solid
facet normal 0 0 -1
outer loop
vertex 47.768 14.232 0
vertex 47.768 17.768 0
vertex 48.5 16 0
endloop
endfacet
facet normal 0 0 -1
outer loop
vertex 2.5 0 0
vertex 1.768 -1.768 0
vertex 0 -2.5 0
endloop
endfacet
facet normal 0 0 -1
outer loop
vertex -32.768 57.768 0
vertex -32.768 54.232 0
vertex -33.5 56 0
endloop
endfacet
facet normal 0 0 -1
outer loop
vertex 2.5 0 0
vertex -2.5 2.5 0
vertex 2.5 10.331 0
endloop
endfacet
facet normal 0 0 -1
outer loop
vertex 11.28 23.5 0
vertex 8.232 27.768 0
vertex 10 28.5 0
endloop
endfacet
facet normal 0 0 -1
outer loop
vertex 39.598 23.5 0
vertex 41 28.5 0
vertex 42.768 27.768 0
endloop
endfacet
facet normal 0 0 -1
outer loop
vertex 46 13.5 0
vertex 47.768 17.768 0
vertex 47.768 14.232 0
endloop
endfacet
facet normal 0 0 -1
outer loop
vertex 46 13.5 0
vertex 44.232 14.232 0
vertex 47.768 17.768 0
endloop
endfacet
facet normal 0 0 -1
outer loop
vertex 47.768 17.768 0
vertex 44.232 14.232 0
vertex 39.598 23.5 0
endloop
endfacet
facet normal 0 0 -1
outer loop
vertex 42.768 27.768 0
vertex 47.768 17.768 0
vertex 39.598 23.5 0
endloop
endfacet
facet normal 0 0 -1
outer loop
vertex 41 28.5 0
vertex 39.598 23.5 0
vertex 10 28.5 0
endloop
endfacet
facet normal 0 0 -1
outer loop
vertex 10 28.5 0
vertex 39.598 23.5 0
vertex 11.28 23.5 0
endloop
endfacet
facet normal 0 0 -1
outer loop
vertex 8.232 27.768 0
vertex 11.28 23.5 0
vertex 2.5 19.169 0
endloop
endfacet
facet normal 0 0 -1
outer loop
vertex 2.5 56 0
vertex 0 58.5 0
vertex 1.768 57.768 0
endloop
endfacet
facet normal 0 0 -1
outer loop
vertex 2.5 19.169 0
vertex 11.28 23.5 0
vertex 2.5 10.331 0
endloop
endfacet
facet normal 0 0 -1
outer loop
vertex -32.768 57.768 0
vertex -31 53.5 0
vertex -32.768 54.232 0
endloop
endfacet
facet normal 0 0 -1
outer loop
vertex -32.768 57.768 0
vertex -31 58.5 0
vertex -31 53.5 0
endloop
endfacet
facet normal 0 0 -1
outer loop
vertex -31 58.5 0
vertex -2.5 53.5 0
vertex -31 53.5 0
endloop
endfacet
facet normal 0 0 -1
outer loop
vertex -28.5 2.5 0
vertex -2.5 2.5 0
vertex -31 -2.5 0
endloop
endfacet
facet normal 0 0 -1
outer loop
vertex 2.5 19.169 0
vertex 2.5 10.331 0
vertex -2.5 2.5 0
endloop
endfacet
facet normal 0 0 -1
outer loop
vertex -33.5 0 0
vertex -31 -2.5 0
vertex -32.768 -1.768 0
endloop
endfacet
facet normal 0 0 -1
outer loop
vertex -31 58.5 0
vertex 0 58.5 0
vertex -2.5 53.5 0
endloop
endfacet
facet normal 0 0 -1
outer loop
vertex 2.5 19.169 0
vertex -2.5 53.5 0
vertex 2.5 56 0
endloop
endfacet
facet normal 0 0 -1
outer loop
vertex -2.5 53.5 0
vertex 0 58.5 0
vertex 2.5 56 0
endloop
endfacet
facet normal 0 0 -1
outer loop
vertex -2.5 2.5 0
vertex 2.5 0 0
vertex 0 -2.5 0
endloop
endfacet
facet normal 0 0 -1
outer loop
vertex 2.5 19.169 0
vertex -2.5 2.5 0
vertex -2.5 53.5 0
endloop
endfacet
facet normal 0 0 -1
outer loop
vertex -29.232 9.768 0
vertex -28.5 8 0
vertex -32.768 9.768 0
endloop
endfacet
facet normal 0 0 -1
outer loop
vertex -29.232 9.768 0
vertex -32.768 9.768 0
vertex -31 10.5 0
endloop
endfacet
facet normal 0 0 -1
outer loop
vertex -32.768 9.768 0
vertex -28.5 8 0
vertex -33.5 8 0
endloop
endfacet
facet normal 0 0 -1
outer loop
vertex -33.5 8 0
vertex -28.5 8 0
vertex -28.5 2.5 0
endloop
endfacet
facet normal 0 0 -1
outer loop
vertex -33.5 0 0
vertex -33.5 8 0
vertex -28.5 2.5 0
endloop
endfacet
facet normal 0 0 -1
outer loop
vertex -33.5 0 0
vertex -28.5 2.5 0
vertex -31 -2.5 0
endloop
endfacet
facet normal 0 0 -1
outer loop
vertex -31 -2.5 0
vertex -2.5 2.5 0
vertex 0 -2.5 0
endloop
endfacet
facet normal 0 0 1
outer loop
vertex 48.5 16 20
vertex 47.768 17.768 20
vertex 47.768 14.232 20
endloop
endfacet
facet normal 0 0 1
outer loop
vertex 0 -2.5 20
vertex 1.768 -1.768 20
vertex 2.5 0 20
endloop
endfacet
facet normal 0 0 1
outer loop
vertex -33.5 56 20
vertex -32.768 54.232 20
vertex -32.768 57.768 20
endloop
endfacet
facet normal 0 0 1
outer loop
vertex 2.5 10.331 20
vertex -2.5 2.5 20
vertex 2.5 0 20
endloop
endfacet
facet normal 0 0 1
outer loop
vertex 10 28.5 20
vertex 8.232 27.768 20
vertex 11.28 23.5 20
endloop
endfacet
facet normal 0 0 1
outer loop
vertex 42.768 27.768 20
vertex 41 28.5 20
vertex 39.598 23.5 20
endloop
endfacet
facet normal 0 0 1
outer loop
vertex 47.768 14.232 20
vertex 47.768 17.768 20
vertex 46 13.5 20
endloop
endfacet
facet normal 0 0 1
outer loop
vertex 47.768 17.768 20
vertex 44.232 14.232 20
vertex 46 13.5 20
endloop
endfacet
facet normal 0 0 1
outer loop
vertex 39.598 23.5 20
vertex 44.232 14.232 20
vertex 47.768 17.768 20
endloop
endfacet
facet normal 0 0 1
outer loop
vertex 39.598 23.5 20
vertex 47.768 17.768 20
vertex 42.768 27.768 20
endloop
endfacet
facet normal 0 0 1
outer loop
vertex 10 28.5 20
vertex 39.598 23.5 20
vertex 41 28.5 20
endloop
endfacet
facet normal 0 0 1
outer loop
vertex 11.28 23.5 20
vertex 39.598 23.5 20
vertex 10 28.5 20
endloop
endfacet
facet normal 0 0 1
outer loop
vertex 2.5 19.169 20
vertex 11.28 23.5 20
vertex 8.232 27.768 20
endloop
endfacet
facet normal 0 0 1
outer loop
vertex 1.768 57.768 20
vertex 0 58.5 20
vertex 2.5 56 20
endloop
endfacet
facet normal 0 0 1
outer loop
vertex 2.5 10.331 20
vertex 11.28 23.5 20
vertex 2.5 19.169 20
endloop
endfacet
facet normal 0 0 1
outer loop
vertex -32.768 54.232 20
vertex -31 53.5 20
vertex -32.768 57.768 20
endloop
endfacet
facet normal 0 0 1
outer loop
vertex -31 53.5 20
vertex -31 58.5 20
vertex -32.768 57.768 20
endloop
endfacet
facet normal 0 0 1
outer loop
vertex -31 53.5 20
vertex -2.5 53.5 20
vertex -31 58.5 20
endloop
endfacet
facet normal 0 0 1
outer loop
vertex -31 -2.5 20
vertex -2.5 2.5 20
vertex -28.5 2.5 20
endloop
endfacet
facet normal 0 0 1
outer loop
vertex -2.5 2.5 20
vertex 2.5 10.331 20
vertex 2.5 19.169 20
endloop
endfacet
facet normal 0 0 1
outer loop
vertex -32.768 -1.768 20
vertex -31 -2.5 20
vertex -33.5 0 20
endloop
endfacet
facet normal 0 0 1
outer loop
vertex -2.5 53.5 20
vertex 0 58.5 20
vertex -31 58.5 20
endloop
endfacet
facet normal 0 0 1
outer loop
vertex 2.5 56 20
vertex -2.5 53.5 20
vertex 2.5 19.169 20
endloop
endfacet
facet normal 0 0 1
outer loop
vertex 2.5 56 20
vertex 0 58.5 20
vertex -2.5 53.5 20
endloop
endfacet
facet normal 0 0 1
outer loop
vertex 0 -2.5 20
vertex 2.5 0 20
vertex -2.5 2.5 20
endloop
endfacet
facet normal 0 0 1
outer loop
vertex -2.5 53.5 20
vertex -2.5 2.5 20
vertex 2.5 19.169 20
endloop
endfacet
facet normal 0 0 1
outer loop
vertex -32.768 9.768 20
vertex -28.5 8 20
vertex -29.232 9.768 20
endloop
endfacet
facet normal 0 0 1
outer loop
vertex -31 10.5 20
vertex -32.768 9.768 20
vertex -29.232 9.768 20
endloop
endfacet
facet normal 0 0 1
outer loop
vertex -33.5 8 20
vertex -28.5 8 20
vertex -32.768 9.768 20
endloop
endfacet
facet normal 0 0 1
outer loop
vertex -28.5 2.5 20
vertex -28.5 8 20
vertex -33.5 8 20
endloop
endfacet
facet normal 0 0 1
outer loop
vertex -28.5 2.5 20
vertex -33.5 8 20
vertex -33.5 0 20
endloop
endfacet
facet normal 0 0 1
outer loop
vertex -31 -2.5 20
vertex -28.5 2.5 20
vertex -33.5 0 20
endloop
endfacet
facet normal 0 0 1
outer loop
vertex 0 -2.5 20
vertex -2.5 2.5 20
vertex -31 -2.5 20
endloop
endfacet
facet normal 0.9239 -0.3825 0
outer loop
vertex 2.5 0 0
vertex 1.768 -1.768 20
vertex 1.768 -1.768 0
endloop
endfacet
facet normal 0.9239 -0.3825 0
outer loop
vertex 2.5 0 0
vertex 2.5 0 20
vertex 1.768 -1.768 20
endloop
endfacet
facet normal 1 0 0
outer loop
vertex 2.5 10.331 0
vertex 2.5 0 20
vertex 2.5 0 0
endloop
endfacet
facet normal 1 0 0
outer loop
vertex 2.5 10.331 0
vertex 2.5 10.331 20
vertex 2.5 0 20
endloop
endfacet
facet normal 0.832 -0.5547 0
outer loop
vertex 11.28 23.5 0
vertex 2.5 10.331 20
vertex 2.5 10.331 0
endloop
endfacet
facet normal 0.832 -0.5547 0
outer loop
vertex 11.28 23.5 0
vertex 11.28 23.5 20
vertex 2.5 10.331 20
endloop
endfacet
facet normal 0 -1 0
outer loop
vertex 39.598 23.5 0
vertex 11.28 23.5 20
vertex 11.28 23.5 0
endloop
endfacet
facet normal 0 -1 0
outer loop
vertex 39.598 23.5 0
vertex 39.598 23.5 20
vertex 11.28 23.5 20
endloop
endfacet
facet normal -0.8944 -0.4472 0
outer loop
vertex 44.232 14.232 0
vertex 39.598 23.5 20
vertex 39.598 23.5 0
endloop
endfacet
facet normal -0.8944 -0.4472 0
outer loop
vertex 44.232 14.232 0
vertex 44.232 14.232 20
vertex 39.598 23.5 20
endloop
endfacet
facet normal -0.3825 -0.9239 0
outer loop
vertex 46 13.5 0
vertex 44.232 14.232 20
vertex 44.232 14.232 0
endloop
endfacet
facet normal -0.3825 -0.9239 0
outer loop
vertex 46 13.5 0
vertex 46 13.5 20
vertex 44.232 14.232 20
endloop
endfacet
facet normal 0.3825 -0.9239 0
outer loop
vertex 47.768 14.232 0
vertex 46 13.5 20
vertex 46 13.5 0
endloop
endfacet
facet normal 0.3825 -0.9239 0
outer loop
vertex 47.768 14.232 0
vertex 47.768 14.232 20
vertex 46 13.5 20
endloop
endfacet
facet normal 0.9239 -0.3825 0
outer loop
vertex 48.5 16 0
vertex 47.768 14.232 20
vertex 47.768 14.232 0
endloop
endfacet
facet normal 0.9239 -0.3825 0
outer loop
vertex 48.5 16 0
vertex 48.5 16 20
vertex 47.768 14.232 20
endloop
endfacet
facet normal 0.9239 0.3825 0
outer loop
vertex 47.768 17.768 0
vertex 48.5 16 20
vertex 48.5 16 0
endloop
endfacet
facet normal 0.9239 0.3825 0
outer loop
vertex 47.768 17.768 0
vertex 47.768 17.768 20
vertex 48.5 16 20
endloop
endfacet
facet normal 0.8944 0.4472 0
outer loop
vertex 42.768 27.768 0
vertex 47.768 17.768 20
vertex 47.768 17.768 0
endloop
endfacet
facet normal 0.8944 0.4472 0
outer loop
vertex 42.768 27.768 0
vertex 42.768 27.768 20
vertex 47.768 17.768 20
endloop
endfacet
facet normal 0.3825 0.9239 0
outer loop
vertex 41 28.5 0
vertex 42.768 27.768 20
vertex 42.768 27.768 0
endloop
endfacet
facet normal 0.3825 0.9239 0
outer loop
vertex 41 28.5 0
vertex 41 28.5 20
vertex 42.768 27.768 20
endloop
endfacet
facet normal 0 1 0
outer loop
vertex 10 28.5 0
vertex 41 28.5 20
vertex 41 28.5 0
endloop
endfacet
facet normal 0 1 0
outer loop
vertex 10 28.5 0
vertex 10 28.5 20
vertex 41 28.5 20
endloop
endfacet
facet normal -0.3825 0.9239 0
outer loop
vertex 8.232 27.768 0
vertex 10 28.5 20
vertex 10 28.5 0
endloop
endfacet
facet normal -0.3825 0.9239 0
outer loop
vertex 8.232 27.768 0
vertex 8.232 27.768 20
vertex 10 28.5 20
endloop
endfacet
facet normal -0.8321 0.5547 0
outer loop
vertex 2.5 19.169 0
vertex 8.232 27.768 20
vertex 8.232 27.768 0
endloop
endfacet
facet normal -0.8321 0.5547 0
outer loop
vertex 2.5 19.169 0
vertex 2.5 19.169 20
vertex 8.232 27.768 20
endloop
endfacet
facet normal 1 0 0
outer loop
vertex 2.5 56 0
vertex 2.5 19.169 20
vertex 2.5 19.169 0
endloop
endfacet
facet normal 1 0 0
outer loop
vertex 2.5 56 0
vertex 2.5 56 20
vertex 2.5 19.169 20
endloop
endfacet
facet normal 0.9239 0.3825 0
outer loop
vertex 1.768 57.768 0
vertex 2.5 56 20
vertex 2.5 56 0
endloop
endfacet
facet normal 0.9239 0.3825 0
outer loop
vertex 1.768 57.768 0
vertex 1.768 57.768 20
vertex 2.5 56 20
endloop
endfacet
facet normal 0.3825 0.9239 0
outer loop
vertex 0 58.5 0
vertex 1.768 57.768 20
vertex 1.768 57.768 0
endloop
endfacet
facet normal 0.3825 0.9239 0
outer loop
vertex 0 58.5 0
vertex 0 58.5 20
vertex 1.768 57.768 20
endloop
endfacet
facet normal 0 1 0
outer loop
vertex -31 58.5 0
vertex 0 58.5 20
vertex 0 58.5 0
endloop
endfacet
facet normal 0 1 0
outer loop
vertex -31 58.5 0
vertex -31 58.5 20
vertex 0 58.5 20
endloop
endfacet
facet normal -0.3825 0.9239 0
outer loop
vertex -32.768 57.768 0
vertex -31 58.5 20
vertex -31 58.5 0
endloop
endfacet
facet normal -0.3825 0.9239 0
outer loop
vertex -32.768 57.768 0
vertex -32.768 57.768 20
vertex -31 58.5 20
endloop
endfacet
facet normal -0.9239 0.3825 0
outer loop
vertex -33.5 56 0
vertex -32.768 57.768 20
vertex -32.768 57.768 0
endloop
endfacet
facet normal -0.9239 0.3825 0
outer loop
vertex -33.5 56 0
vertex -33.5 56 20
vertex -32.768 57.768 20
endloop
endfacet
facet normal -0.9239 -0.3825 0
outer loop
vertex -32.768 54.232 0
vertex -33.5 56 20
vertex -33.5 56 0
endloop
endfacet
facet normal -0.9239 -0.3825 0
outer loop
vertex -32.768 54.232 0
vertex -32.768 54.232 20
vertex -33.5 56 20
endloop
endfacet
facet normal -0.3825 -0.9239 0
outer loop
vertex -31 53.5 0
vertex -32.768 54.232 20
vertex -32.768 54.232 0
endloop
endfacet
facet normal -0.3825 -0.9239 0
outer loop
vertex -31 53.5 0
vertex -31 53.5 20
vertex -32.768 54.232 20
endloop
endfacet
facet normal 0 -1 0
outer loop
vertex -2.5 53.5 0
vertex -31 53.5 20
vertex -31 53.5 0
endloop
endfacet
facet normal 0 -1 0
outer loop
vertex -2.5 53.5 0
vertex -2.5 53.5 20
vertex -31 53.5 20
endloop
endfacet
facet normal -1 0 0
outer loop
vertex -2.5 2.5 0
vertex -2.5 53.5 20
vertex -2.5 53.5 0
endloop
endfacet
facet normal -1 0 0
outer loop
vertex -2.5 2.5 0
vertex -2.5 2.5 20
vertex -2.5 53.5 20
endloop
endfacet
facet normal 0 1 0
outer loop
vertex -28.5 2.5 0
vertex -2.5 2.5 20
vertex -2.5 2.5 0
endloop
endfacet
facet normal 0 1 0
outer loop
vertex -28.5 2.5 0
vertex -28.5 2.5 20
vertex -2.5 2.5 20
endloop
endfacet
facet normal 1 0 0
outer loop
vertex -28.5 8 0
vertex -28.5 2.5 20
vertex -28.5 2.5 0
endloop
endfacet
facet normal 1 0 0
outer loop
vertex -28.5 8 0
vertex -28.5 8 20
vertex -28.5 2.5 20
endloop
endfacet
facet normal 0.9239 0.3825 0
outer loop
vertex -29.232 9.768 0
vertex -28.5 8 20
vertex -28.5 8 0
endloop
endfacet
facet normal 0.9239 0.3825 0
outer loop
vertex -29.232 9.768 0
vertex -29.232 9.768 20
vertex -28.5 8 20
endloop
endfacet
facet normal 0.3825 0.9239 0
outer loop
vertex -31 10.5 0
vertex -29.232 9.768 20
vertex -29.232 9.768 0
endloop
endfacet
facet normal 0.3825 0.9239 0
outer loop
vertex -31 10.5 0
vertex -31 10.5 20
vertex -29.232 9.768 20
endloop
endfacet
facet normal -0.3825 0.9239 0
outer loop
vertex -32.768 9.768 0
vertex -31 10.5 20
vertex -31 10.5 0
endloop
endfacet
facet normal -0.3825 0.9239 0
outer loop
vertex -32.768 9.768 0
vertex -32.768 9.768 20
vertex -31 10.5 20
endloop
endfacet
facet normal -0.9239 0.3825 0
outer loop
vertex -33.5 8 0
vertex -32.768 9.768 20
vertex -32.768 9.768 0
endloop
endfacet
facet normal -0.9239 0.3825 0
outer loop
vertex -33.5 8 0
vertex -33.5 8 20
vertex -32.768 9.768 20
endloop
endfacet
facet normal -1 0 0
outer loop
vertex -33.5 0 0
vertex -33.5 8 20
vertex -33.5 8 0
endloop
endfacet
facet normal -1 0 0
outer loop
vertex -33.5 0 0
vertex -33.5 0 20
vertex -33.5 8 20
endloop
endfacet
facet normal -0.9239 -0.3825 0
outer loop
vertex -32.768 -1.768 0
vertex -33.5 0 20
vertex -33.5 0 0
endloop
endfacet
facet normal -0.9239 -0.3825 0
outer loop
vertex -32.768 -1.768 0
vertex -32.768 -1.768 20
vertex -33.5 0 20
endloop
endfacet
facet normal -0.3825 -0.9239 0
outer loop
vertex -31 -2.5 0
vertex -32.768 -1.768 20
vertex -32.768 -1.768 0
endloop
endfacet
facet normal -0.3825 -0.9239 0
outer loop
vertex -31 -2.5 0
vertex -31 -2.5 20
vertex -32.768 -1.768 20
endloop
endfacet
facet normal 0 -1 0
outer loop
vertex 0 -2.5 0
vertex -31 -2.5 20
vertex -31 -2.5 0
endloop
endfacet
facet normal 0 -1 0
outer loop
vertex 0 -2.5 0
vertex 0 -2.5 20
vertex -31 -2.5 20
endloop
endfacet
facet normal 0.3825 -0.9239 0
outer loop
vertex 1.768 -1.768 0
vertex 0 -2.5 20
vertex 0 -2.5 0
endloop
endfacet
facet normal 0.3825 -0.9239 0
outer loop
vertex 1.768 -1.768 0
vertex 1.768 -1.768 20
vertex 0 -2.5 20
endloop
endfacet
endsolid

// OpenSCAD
linear_extrude(height = 20) {
    line([
        [-31, 8],
        [0, -8],
        [31, 0],
        [0, 56],
        [-31, 0],
        [31, 0],
        [0, -45],
        [10, 15],
        [31, 0],
        [5, -10],
    ]);
}

module line(points) {
    x = points[0][0];
    y = points[0][1];
    dx = points[1][0];
    dy = points[1][1];
    union() {
        hull() {
            translate([x, y, 0]) circle(2.5);
            translate([x+dx, y+dy, 0]) circle(2.5);
        }
    }
    if (len(points) > 2) {
        line([for (i = [1:len(points)-1]) if (i == 1) [x+dx, y+dy] else points[i]]);
    }
}
